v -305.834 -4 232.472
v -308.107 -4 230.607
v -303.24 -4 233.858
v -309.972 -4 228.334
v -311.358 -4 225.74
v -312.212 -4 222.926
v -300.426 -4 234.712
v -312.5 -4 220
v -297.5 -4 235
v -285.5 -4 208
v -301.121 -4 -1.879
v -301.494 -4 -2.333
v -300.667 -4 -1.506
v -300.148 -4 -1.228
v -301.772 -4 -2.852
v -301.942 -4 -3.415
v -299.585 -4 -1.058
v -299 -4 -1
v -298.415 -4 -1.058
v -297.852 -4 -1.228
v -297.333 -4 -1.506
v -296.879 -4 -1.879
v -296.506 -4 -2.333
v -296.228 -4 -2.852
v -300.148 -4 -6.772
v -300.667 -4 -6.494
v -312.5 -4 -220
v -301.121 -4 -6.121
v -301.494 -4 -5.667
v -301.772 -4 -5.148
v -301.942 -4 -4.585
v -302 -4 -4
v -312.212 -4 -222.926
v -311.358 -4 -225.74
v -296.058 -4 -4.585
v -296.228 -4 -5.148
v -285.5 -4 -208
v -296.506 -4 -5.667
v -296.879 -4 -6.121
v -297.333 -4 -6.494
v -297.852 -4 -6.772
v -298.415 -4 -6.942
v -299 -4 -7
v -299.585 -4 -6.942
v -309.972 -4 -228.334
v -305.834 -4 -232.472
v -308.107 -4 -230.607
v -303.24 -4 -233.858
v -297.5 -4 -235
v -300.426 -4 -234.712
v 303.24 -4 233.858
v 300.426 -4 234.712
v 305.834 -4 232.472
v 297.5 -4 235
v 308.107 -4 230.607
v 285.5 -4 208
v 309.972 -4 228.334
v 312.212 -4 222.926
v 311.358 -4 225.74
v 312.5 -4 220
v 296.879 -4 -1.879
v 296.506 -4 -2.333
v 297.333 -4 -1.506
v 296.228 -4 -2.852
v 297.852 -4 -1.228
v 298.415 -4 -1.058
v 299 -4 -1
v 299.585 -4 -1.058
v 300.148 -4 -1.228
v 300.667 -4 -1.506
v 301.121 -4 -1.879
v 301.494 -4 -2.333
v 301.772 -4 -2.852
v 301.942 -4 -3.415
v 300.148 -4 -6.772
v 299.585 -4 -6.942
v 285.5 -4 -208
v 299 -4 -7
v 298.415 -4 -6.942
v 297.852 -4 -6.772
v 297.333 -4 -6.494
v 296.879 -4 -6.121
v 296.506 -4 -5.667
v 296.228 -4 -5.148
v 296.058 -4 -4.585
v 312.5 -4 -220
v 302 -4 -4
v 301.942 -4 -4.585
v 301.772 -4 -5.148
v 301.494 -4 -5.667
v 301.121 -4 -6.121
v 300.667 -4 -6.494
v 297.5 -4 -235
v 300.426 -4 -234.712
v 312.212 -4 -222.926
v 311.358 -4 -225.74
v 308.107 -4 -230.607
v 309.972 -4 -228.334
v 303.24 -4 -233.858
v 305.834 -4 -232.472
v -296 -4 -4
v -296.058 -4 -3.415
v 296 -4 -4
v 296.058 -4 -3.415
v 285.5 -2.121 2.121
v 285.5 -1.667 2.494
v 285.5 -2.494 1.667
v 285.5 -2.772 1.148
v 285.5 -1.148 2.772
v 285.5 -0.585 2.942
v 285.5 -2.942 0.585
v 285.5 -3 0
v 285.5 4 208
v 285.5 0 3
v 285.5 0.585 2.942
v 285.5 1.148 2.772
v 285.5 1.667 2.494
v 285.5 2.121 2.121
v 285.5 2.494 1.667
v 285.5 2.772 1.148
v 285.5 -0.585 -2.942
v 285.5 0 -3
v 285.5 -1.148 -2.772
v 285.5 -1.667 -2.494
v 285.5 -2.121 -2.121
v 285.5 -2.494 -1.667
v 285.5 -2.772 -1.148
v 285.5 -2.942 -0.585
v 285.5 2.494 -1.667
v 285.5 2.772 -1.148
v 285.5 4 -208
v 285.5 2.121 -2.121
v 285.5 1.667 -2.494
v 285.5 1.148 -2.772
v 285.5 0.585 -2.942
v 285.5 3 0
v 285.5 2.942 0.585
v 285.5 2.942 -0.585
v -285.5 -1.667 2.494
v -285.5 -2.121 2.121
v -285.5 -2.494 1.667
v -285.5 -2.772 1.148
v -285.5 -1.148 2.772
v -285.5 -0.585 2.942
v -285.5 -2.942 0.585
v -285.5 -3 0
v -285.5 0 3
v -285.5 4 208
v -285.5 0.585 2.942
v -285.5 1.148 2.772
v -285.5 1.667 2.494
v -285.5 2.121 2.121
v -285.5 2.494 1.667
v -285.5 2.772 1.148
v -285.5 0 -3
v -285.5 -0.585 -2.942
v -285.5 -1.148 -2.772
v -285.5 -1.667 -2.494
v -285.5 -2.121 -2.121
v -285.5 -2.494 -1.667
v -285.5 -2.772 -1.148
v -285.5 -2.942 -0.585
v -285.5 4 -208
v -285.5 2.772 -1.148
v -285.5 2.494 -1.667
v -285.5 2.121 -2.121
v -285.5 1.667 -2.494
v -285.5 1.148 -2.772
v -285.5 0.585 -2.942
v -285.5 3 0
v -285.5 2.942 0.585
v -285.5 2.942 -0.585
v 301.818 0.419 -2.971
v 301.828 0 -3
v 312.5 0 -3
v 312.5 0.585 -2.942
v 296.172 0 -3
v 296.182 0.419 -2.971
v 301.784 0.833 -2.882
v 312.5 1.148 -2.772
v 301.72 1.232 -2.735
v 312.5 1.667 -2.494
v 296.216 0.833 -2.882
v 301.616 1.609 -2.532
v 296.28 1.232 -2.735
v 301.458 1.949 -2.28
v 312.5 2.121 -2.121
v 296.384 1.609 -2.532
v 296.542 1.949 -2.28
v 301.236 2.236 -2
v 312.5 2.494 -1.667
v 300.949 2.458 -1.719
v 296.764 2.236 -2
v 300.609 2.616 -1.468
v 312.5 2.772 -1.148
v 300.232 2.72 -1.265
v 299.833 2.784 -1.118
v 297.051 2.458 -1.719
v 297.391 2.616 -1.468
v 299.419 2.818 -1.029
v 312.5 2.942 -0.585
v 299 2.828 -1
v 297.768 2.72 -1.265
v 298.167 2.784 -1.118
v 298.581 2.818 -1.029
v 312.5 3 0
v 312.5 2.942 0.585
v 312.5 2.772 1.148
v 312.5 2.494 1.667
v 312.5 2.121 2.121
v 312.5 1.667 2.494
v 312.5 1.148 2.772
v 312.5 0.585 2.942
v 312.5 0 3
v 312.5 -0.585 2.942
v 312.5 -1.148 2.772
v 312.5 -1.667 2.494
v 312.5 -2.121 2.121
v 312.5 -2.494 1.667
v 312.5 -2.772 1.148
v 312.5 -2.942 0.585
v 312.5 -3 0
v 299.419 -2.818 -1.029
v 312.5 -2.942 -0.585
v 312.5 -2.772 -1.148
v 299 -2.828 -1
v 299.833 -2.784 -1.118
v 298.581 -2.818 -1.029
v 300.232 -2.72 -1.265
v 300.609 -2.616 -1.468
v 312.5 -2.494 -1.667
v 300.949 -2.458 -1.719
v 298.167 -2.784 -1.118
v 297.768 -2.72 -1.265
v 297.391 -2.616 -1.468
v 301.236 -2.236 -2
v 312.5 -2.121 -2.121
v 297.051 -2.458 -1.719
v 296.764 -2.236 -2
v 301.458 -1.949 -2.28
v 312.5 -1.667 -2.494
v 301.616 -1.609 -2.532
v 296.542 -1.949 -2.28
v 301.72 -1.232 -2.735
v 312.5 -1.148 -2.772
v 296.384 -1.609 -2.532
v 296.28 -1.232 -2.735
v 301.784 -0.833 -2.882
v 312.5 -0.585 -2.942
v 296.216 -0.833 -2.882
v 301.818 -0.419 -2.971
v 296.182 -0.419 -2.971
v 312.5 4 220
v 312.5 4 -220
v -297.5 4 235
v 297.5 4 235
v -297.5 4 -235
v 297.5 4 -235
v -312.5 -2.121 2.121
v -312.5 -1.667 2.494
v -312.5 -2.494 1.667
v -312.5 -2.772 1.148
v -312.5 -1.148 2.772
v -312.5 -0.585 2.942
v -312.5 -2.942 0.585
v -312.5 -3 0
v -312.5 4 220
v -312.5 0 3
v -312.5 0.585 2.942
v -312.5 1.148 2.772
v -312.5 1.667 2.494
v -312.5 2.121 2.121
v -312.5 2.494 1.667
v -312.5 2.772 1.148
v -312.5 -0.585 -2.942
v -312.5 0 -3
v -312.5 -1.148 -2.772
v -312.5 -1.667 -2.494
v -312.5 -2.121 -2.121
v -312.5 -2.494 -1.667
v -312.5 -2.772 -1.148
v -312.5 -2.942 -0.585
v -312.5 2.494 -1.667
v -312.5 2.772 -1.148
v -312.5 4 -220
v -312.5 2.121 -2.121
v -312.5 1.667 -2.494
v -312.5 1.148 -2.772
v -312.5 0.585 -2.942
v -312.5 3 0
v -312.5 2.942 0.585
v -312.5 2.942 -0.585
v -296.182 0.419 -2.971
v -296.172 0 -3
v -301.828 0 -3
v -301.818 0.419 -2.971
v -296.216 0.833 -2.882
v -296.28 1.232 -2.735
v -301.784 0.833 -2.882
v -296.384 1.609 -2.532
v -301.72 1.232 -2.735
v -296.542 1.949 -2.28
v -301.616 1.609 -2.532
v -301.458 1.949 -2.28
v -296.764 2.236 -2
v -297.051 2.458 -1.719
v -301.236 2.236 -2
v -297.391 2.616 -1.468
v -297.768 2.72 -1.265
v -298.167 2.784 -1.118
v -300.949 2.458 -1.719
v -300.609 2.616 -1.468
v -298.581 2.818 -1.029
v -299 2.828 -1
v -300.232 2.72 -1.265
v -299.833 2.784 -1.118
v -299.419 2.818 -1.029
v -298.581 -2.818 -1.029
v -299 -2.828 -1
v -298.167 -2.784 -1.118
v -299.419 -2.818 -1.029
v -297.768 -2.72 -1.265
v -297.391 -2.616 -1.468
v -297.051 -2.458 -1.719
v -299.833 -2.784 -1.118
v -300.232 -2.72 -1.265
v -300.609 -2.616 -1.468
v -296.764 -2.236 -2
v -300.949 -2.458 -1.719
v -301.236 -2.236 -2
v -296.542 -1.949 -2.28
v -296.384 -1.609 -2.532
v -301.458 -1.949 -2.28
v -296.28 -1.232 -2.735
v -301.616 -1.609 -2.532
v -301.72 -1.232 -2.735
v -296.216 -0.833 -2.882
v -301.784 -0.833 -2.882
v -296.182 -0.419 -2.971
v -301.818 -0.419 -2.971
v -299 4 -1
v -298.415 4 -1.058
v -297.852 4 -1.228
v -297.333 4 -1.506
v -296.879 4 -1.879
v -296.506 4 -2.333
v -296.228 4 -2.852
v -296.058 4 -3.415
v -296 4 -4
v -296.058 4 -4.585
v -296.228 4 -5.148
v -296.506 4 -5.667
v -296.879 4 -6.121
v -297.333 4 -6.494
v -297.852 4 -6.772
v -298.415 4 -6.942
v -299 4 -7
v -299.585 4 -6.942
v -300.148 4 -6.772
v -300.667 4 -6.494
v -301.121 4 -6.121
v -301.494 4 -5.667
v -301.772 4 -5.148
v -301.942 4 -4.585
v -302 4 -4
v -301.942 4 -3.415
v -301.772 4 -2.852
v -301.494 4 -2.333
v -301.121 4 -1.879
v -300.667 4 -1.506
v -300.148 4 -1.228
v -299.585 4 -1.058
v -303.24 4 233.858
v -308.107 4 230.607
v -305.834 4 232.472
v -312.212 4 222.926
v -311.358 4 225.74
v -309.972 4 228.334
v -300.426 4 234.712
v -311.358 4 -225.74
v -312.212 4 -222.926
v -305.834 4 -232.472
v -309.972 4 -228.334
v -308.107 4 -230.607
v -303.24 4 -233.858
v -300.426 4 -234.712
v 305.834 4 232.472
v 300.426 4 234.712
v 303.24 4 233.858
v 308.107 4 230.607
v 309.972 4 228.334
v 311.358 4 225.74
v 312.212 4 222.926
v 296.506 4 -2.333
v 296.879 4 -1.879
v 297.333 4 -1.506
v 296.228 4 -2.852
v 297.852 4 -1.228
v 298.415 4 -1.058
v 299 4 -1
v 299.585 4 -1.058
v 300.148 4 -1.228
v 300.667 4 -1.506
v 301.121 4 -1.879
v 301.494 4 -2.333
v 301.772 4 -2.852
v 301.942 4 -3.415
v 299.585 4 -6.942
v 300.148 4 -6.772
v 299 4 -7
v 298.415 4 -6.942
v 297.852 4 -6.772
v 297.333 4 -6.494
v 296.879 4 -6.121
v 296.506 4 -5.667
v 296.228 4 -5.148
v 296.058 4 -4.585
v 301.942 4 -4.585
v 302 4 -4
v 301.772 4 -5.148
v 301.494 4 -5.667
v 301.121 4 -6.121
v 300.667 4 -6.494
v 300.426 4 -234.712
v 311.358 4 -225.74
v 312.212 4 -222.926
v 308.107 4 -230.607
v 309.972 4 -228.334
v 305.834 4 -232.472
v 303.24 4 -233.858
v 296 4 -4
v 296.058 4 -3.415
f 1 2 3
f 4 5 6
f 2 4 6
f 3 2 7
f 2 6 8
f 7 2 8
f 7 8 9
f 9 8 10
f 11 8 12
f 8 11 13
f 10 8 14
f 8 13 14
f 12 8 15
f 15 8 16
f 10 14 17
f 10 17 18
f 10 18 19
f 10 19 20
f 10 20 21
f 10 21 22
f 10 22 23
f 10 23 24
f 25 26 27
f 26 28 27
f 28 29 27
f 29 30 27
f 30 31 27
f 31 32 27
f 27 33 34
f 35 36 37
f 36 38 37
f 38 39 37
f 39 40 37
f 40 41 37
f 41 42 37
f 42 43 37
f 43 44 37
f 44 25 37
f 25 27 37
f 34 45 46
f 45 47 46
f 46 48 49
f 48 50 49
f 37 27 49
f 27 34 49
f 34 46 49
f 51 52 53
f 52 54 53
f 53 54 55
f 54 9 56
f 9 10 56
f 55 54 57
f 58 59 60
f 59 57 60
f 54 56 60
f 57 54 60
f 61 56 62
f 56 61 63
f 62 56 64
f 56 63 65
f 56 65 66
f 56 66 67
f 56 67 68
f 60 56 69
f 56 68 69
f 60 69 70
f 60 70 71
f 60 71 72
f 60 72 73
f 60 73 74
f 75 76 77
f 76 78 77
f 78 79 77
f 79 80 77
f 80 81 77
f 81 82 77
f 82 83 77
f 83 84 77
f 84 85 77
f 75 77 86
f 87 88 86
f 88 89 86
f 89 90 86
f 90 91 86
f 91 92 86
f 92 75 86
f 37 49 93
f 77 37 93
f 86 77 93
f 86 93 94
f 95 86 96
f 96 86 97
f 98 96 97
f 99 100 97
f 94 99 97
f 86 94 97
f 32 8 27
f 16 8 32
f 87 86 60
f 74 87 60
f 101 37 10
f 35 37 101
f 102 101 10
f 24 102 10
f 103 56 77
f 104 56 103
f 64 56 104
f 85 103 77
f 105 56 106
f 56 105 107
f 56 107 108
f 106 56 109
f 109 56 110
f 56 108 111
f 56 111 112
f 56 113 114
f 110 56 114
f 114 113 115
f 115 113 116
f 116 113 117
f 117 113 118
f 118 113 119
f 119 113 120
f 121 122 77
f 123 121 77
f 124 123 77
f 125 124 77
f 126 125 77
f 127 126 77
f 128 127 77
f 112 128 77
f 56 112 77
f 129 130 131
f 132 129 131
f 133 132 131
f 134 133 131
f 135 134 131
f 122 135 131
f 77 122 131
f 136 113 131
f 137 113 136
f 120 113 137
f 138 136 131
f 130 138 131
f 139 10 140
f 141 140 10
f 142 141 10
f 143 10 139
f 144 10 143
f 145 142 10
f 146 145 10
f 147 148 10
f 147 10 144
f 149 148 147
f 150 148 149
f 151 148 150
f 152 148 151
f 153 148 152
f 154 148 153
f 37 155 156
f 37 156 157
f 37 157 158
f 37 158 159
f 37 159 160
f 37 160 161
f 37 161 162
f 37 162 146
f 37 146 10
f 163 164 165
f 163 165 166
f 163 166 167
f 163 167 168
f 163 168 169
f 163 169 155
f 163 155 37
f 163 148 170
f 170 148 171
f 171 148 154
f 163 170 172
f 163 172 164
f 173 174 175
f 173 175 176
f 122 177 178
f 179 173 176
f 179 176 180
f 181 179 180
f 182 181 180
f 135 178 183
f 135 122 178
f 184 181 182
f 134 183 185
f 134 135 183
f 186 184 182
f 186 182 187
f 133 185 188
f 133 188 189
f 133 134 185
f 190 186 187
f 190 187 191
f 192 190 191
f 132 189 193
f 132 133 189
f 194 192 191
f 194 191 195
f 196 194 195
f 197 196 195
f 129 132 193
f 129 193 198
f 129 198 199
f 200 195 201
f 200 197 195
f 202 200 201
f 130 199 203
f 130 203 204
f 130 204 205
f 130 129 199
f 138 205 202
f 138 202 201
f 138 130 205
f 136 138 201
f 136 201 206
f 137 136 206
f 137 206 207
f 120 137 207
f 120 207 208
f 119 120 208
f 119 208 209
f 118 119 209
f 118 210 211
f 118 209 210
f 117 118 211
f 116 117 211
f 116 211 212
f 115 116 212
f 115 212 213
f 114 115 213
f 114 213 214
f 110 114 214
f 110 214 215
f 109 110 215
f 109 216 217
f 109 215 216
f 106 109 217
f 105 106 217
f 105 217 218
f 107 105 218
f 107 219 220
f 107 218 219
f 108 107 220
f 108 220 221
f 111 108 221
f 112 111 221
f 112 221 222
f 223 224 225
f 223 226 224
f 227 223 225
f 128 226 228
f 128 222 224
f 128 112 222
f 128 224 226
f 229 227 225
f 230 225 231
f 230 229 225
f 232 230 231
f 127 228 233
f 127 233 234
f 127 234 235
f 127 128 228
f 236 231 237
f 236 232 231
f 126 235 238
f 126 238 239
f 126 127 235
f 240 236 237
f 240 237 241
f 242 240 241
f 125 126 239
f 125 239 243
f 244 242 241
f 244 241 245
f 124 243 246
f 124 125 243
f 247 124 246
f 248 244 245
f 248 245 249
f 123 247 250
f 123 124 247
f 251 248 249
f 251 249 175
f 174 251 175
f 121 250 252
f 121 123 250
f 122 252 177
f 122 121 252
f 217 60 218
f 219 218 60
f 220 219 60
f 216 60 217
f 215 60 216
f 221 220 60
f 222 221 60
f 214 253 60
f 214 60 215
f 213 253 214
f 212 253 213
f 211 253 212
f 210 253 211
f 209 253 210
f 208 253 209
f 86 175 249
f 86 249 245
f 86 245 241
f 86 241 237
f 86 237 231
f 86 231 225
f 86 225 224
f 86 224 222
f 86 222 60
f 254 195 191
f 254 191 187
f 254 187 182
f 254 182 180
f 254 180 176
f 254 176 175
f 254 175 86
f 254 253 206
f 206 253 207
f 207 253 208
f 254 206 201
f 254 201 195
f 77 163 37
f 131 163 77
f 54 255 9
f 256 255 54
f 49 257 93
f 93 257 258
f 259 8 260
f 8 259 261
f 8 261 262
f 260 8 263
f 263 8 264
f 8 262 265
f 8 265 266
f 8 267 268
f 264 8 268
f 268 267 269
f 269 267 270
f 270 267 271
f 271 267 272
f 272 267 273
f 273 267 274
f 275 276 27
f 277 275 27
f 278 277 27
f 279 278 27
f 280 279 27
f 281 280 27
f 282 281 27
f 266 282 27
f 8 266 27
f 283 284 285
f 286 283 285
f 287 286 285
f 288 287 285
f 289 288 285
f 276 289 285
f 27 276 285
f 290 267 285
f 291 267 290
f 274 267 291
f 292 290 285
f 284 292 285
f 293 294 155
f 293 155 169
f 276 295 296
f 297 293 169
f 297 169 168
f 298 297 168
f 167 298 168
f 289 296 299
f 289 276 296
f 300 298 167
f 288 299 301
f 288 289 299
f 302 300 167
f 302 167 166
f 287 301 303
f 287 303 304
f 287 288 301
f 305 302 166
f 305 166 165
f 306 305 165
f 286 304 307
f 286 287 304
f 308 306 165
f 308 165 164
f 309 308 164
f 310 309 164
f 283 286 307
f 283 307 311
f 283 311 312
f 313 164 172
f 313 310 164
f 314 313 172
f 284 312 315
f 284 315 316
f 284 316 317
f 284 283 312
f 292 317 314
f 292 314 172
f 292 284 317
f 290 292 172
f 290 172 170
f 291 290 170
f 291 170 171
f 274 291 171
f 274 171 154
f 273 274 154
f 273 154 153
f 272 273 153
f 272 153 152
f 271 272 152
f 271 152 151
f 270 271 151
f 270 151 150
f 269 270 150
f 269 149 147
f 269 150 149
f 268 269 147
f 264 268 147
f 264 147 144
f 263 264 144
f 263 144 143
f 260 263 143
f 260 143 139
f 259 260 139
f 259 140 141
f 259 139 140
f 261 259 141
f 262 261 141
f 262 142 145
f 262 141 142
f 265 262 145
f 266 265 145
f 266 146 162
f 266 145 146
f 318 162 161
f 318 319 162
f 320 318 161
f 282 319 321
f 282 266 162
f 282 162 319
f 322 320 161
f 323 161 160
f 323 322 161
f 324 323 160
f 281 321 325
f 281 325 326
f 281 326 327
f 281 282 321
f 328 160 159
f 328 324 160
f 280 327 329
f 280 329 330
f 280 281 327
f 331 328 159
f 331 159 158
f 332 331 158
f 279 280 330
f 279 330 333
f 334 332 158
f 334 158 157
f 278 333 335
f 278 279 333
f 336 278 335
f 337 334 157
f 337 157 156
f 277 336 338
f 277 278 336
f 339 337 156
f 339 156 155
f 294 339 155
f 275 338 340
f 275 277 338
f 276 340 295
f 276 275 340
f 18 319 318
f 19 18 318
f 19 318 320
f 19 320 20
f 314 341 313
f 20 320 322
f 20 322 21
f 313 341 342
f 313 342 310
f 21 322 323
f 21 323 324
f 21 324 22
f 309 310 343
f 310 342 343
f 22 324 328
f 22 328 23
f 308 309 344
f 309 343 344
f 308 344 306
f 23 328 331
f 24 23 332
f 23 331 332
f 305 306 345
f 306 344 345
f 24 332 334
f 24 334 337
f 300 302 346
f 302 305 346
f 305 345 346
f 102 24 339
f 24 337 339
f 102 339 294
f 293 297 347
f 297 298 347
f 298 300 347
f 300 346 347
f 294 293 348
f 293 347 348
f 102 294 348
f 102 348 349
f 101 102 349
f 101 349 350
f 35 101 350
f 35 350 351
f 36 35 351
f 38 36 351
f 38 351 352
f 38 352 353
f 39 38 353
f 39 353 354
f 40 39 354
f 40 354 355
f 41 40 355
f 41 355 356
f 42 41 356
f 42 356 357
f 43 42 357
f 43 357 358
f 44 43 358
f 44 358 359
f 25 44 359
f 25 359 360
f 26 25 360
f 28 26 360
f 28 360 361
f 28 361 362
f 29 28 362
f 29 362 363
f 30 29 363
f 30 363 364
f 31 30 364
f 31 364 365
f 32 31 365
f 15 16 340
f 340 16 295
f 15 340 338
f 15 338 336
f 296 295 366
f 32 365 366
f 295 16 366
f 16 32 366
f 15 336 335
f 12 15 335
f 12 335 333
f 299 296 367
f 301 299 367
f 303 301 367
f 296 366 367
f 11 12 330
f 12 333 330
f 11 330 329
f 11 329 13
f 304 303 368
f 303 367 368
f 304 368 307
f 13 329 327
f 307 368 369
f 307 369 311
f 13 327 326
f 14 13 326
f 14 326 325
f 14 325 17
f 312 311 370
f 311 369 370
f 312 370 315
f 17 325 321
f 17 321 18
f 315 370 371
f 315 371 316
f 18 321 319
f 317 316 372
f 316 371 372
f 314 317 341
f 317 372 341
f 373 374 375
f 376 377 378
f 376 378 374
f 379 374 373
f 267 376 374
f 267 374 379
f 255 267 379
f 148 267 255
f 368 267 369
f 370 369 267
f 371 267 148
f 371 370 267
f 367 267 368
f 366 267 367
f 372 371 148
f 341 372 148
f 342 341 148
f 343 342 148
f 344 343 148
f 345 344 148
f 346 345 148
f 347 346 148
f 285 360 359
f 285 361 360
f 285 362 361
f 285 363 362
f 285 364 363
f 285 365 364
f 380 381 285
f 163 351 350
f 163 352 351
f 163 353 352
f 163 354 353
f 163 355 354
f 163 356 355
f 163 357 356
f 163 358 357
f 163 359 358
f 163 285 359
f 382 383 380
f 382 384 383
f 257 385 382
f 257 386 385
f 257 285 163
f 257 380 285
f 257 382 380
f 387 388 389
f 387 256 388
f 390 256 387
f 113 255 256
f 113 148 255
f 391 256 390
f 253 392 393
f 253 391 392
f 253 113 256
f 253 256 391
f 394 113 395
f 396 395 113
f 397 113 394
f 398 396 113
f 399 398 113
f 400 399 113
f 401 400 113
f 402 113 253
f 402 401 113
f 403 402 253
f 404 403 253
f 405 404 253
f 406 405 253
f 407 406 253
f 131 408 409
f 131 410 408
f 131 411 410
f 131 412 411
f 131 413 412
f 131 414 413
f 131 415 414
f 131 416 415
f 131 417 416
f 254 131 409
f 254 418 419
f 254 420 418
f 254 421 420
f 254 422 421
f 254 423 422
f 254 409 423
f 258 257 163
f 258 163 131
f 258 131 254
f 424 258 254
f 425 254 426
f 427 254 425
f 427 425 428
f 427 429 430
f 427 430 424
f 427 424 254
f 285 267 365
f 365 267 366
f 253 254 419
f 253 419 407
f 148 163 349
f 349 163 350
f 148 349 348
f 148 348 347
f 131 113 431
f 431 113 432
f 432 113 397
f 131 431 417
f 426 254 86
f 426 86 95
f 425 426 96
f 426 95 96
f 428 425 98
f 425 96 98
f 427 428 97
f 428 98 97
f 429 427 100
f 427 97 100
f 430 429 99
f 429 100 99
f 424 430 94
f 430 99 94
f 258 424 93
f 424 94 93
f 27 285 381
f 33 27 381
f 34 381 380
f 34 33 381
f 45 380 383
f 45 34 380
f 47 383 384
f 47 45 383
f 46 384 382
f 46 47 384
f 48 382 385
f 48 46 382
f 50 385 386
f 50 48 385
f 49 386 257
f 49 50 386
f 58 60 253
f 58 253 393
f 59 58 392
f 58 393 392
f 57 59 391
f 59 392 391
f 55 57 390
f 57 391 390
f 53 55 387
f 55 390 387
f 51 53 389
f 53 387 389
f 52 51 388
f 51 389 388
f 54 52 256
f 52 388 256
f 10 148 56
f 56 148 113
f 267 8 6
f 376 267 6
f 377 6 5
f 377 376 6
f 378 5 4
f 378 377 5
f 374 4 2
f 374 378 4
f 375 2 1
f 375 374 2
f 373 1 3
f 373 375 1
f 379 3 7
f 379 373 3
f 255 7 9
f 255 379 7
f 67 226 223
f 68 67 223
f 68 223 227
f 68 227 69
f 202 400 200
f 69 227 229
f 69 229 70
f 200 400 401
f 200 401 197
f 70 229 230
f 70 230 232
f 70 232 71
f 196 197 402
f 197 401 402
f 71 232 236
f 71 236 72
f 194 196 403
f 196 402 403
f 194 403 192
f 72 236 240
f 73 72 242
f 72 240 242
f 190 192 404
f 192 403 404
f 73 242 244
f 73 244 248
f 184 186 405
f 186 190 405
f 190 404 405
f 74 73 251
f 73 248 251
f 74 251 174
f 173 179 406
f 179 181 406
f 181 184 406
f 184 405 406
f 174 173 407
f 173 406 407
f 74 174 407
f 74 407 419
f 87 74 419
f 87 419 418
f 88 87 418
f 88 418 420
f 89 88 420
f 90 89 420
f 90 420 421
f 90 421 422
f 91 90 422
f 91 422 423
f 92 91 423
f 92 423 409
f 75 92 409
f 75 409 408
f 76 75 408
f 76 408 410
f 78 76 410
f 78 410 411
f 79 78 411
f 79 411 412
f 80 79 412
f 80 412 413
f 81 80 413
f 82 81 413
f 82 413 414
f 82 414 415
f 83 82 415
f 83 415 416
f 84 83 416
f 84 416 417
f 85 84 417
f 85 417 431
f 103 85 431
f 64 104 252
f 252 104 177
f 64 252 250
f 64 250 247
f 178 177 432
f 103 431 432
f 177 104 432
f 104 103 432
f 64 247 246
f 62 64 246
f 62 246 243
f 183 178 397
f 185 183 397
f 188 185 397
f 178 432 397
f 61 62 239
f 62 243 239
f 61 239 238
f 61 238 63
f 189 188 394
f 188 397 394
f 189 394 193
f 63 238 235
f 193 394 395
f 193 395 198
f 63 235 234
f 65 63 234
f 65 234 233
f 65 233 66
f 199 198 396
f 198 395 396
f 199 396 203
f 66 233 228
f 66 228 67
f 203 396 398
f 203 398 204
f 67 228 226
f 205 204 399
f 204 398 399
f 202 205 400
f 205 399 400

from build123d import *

# Parameters (mm, degrees)
SKETCH_1_W               = 625
SKETCH_1_H               = 470
SKETCH_1_W_2             = 571
SKETCH_1_H_2             = 416
EXTRUDE_1_DEPTH          = 4
FILLET_1_R               = 15
CUT_EXTRUDE_2_DEPTH      = 392.020779499
CUT_EXTRUDE_2_DEPTH_BACK = 392.020779499
SKETCH_3_R               = 3
SKETCH_4_R               = 3
CUT_EXTRUDE_3_DEPTH      = 392.082152495


with BuildPart() as part:
    # Эскиз1 → Бобышка-Вытянуть1 (new, symmetric)
    with BuildSketch(Plane(origin=(0, 0, 0), x_dir=(1, 0, 0), z_dir=(0, 1, 0))):
        Rectangle(SKETCH_1_W, SKETCH_1_H)
        Rectangle(SKETCH_1_W_2, SKETCH_1_H_2, mode=Mode.SUBTRACT)
    extrude(amount=EXTRUDE_1_DEPTH, both=True)

    # Скругление1
    fillet_1_edges = [part.edges().sort_by_distance(p)[0] for p in [
        (-312.5, 0, -235),
        (312.5, 0, -235),
        (312.5, 0, 235),
        (-312.5, 0, 235),
    ]]
    fillet(fillet_1_edges, radius=FILLET_1_R)

    # Эскиз3 → Вырез-Вытянуть2 (cut, two sides: drawn at the far end of the back side and taken through both)
    with BuildSketch(Plane(origin=(0, 0, 0), x_dir=(0, 0, -1), z_dir=(1, 0, 0)).offset(-CUT_EXTRUDE_2_DEPTH_BACK)):
        Circle(SKETCH_3_R)
    extrude(amount=CUT_EXTRUDE_2_DEPTH + CUT_EXTRUDE_2_DEPTH_BACK, mode=Mode.SUBTRACT)

    # Эскиз4 → Вырез-Вытянуть3 (cut, through all)
    with BuildSketch(Plane(origin=(0, 4, 0), x_dir=(1, 0, 0), z_dir=(0, 1, 0))):
        with Locations(Location((-299, 4, 0), (0, 0, 270))):
            Circle(SKETCH_4_R)
        with Locations(Location((299, 4, 0), (0, 0, 270))):
            Circle(SKETCH_4_R)
    extrude(amount=-CUT_EXTRUDE_3_DEPTH, mode=Mode.SUBTRACT)


solid = part.part
